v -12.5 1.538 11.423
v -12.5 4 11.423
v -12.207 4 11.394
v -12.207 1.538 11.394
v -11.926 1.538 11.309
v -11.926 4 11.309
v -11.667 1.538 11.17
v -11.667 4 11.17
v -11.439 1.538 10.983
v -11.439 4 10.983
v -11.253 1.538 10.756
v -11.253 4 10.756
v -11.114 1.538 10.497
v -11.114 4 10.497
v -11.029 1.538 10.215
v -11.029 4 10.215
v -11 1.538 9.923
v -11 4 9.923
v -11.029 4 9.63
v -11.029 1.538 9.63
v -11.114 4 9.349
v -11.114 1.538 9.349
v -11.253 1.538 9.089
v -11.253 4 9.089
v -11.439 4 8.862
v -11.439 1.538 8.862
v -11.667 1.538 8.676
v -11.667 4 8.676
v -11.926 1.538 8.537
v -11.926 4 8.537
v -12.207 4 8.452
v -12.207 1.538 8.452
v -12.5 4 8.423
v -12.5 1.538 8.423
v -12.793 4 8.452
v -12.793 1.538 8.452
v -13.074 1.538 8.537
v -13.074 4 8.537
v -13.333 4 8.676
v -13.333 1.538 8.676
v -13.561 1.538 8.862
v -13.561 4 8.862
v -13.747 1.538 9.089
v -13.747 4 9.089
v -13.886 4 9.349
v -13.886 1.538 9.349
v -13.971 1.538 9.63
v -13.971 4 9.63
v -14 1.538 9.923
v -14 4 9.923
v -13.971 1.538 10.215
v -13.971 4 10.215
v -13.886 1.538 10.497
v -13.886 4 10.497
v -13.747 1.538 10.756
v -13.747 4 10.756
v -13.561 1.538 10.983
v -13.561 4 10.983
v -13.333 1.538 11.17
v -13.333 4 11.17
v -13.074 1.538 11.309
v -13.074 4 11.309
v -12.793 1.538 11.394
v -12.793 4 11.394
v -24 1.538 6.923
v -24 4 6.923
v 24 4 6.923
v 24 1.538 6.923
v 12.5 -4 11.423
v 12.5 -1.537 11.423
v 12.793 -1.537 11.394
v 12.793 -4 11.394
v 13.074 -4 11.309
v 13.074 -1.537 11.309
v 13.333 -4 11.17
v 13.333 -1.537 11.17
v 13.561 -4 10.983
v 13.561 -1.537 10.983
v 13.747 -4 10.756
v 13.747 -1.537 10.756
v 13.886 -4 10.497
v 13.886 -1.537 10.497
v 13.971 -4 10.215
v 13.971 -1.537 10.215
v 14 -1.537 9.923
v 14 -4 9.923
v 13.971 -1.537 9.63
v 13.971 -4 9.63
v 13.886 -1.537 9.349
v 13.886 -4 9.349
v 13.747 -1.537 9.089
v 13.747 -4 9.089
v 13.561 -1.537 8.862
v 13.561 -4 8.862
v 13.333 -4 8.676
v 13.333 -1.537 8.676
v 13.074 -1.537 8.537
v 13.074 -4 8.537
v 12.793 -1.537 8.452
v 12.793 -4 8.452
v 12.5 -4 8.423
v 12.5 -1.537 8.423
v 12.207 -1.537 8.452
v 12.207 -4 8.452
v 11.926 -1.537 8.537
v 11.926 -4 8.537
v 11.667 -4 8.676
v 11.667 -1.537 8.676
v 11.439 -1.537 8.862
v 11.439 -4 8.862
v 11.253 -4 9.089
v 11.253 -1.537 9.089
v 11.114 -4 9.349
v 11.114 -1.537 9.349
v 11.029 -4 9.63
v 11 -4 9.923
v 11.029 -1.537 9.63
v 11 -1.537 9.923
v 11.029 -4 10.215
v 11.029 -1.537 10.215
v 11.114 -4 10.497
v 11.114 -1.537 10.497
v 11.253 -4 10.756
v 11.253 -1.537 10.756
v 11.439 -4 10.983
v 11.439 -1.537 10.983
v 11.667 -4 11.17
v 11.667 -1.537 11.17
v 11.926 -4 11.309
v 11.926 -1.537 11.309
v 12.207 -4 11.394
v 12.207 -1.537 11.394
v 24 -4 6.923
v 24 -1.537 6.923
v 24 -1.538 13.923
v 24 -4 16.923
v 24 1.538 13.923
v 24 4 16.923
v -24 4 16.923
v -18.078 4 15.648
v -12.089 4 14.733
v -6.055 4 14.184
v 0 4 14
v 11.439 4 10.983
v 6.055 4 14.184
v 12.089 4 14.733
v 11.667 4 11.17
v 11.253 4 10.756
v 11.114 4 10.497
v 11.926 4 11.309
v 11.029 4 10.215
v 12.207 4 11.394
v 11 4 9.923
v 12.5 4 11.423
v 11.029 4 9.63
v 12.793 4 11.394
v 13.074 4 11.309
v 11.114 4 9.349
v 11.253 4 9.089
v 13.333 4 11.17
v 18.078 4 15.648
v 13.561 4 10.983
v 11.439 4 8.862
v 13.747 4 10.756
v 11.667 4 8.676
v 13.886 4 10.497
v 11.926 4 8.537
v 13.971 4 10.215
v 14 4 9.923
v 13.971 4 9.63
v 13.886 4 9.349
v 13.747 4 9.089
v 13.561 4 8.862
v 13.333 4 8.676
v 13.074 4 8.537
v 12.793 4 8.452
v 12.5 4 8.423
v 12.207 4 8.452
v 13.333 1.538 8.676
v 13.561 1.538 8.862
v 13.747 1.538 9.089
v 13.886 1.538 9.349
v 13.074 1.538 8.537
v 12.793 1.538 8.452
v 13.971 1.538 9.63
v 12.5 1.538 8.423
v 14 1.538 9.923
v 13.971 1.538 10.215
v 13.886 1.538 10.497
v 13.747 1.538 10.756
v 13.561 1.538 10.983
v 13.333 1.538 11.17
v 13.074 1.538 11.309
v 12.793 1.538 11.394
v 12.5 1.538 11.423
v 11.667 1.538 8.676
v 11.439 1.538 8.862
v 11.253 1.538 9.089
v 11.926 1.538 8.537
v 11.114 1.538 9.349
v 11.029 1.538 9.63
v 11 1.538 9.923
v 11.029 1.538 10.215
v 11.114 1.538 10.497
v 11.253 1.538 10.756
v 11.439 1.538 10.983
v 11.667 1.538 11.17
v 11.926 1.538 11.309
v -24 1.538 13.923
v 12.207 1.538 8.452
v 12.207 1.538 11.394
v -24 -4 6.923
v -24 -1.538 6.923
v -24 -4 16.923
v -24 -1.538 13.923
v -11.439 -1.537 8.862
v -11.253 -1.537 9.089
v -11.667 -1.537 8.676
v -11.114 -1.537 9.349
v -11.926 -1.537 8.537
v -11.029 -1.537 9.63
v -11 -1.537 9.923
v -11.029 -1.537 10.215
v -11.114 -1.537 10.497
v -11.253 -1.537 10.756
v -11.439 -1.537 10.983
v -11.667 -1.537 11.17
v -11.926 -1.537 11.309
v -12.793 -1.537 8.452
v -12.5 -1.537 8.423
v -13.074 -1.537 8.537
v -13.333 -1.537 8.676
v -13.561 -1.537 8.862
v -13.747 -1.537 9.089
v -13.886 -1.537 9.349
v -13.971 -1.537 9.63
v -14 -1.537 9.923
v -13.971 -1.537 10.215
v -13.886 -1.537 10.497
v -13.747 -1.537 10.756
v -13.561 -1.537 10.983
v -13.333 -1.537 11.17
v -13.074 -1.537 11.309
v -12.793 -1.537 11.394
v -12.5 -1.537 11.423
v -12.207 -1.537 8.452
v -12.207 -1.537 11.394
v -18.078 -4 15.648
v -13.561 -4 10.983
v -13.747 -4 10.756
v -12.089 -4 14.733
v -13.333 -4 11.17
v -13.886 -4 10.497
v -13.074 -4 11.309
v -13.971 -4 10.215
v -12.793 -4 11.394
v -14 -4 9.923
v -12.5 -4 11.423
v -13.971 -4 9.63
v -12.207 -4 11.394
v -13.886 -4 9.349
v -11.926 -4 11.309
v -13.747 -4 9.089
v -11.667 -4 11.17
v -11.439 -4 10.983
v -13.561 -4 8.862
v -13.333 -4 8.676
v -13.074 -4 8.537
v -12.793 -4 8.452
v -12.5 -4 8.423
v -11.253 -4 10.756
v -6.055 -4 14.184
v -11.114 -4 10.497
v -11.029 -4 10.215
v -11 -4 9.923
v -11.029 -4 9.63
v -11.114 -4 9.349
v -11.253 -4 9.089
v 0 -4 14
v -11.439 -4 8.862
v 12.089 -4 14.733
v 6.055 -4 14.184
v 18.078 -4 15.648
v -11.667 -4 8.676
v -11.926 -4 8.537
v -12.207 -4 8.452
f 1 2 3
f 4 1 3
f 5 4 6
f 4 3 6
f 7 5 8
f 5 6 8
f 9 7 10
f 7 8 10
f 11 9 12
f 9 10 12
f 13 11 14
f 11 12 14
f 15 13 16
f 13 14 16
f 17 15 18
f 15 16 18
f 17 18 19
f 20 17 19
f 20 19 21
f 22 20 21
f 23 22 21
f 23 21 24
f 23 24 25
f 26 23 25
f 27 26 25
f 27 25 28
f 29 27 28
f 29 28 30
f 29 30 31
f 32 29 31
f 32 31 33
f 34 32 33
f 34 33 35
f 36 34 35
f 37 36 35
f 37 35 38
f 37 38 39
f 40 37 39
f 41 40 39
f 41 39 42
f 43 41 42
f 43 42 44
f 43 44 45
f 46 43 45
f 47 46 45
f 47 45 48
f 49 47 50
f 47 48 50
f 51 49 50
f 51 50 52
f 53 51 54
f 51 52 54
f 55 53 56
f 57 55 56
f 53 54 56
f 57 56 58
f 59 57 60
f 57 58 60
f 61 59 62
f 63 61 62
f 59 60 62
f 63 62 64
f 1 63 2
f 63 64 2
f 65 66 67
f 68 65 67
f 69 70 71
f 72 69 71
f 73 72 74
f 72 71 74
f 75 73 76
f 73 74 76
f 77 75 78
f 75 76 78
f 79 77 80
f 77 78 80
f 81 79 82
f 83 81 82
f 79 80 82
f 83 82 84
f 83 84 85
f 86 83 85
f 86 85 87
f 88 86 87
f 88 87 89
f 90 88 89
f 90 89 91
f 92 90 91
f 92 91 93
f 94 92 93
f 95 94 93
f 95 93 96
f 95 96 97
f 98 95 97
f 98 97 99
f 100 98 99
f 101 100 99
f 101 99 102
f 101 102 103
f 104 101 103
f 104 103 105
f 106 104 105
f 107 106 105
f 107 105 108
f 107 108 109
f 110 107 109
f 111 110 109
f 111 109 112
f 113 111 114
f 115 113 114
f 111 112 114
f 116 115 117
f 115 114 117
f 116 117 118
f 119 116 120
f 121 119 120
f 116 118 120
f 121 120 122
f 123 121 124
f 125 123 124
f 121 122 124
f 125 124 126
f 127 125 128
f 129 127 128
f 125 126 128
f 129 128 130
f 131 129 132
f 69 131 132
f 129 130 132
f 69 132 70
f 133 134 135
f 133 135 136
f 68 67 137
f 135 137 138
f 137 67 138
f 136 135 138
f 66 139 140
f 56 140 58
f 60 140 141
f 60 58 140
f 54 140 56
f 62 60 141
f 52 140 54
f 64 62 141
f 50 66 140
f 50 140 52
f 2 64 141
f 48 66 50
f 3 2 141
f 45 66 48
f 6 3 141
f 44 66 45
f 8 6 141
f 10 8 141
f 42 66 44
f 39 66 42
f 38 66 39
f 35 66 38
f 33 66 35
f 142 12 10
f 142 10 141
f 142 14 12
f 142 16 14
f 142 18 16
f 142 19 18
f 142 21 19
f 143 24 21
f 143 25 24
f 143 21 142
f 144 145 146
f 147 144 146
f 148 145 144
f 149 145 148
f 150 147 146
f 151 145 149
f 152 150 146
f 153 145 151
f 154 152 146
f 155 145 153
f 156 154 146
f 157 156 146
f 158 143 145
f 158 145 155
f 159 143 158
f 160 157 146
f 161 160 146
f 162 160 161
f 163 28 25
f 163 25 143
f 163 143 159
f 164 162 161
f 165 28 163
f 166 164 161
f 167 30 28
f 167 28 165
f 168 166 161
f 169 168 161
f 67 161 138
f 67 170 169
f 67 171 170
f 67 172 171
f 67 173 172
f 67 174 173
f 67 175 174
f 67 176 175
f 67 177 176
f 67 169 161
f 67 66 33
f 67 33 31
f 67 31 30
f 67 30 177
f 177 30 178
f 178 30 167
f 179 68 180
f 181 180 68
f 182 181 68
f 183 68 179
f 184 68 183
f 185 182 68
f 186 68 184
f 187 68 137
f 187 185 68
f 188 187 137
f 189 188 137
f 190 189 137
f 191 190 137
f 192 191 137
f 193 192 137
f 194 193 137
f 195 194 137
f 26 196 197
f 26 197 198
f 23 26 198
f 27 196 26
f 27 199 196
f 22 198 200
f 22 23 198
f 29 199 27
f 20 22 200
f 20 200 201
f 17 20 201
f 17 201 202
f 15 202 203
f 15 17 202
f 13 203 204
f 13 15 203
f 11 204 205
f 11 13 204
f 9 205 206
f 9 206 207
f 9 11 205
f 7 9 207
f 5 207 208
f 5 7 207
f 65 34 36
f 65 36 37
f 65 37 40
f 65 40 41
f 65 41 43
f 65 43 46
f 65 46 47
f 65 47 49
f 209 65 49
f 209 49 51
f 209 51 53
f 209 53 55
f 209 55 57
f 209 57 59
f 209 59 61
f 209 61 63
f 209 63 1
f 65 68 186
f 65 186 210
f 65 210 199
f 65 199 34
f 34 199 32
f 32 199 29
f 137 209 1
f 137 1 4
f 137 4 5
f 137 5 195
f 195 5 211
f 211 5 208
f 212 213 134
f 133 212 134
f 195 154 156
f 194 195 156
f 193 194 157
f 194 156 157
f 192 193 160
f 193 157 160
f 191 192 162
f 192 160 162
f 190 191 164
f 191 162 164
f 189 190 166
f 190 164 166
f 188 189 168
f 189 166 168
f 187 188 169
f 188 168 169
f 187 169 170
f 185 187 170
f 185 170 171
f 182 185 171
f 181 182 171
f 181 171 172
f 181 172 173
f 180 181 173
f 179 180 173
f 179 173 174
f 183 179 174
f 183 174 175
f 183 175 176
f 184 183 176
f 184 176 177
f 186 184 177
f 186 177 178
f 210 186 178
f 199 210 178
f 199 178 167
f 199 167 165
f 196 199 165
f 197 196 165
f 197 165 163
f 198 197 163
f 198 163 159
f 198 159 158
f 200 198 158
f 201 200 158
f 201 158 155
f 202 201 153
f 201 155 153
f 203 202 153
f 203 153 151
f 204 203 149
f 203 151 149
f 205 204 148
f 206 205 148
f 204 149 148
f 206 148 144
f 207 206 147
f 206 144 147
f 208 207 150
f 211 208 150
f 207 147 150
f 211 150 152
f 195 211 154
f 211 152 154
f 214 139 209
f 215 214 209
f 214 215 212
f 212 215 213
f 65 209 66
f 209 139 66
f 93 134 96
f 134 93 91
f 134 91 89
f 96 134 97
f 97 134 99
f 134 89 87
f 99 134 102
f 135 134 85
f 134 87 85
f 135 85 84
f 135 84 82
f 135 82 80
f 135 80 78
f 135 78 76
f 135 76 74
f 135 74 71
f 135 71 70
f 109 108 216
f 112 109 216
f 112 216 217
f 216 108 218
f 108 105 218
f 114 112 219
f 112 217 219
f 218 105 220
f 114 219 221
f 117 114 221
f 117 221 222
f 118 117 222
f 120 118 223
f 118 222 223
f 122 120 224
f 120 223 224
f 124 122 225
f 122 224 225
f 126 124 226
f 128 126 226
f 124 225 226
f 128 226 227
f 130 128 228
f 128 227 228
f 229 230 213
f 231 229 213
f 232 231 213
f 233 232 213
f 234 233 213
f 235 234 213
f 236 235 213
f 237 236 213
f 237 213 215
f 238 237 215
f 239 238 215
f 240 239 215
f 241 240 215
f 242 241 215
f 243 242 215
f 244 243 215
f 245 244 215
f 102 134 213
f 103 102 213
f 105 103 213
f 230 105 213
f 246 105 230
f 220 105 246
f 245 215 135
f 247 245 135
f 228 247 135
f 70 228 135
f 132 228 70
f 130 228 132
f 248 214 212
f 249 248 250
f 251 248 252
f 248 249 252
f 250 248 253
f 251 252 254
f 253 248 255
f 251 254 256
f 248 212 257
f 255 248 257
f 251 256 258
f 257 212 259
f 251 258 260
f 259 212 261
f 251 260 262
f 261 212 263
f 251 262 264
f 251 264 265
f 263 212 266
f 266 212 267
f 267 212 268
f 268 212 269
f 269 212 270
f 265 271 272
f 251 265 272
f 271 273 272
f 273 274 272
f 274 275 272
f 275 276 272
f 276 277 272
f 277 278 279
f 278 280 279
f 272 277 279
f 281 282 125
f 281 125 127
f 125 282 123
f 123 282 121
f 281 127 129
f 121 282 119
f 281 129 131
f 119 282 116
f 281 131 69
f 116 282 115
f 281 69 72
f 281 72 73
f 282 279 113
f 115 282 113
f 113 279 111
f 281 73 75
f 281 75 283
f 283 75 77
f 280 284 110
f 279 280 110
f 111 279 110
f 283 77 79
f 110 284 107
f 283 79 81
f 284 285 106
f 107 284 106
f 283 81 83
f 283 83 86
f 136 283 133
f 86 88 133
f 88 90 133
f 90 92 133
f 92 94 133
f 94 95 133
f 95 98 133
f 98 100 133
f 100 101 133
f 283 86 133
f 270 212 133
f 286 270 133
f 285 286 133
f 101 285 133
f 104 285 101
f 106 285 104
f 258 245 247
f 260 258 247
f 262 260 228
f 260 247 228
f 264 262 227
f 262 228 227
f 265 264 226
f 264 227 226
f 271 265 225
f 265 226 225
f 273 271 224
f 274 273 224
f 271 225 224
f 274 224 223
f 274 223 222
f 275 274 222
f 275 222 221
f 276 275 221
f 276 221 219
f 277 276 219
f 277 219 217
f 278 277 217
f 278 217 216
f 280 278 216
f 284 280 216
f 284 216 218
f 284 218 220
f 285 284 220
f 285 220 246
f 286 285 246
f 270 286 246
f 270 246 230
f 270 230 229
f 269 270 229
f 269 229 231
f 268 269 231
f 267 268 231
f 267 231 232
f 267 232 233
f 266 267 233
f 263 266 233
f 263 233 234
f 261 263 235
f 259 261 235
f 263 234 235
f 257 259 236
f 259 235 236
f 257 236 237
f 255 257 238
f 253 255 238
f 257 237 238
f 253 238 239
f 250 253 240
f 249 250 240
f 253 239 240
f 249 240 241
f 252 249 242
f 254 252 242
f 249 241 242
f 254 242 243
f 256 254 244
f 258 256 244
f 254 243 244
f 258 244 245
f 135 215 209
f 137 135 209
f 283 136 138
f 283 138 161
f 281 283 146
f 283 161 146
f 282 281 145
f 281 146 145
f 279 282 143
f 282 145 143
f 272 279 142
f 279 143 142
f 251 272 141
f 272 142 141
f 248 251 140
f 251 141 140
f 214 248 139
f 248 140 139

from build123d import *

# Parameters (mm, degrees)
BOSS_EXTRUDE1_DEPTH = 4
SKETCH10_R          = 1.5
SKETCH10_W          = 40
SKETCH10_H          = 6.922711204
CUT_EXTRUDE2_DEPTH  = 31.436460939
SKETCH11_W          = 48
SKETCH11_H          = 1.077288796
BOSS_EXTRUDE2_DEPTH = 8
SKETCH12_W          = 7
SKETCH12_H          = 3.075
CUT_EXTRUDE3_DEPTH  = 52.052699777


with BuildPart() as part:
    # Sketch1 → Boss-Extrude1 (new, symmetric)
    with BuildSketch(Plane(origin=(0, 0, 0), x_dir=(1, 0, 0), z_dir=(0, 1, 0))):
        with BuildLine():
            Line((-20, 0), (0, 0))
            Line((0, 0), (20, 0))
            Line((20, 0), (20, -8))
            Line((20, -8), (24, -8))
            Line((24, -8), (24, -16.922711204))
            ThreePointArc((24, -16.922711204), (0, -14), (-24, -16.922711204))
            Line((-24, -16.922711204), (-24, -8))
            Line((-24, -8), (-20, -8))
            Line((-20, -8), (-20, 0))
        make_face()
    extrude(amount=BOSS_EXTRUDE1_DEPTH, both=True)

    # Sketch10 → Cut-Extrude2 (cut, through all)
    with BuildSketch(Plane(origin=(0, 4, 0), x_dir=(1, 0, 0), z_dir=(0, 1, 0))):
        with Locations(Location((-12.5, -9.922711204, 0), (0, 0, 270))):
            Circle(SKETCH10_R)
        with Locations(Location((12.5, -9.922711204, 0), (0, 0, 270))):
            Circle(SKETCH10_R)
        with Locations((0, -3.461355602)):
            Rectangle(SKETCH10_W, SKETCH10_H)
    extrude(amount=-CUT_EXTRUDE2_DEPTH, mode=Mode.SUBTRACT)

    # Sketch11 → Boss-Extrude2 (add)
    with BuildSketch(Plane(origin=(0, 4, 0), x_dir=(1, 0, 0), z_dir=(0, 1, 0))):
        with Locations((0, -7.461355602)):
            Rectangle(SKETCH11_W, SKETCH11_H)
    extrude(amount=-BOSS_EXTRUDE2_DEPTH)

    # Sketch12 → Cut-Extrude3 (cut, through all)
    with BuildSketch(Plane.ZY.offset(24)):
        with Locations((10.422711204, 0)):
            Rectangle(SKETCH12_W, SKETCH12_H)
    extrude(amount=-CUT_EXTRUDE3_DEPTH, mode=Mode.SUBTRACT)


solid = part.part
